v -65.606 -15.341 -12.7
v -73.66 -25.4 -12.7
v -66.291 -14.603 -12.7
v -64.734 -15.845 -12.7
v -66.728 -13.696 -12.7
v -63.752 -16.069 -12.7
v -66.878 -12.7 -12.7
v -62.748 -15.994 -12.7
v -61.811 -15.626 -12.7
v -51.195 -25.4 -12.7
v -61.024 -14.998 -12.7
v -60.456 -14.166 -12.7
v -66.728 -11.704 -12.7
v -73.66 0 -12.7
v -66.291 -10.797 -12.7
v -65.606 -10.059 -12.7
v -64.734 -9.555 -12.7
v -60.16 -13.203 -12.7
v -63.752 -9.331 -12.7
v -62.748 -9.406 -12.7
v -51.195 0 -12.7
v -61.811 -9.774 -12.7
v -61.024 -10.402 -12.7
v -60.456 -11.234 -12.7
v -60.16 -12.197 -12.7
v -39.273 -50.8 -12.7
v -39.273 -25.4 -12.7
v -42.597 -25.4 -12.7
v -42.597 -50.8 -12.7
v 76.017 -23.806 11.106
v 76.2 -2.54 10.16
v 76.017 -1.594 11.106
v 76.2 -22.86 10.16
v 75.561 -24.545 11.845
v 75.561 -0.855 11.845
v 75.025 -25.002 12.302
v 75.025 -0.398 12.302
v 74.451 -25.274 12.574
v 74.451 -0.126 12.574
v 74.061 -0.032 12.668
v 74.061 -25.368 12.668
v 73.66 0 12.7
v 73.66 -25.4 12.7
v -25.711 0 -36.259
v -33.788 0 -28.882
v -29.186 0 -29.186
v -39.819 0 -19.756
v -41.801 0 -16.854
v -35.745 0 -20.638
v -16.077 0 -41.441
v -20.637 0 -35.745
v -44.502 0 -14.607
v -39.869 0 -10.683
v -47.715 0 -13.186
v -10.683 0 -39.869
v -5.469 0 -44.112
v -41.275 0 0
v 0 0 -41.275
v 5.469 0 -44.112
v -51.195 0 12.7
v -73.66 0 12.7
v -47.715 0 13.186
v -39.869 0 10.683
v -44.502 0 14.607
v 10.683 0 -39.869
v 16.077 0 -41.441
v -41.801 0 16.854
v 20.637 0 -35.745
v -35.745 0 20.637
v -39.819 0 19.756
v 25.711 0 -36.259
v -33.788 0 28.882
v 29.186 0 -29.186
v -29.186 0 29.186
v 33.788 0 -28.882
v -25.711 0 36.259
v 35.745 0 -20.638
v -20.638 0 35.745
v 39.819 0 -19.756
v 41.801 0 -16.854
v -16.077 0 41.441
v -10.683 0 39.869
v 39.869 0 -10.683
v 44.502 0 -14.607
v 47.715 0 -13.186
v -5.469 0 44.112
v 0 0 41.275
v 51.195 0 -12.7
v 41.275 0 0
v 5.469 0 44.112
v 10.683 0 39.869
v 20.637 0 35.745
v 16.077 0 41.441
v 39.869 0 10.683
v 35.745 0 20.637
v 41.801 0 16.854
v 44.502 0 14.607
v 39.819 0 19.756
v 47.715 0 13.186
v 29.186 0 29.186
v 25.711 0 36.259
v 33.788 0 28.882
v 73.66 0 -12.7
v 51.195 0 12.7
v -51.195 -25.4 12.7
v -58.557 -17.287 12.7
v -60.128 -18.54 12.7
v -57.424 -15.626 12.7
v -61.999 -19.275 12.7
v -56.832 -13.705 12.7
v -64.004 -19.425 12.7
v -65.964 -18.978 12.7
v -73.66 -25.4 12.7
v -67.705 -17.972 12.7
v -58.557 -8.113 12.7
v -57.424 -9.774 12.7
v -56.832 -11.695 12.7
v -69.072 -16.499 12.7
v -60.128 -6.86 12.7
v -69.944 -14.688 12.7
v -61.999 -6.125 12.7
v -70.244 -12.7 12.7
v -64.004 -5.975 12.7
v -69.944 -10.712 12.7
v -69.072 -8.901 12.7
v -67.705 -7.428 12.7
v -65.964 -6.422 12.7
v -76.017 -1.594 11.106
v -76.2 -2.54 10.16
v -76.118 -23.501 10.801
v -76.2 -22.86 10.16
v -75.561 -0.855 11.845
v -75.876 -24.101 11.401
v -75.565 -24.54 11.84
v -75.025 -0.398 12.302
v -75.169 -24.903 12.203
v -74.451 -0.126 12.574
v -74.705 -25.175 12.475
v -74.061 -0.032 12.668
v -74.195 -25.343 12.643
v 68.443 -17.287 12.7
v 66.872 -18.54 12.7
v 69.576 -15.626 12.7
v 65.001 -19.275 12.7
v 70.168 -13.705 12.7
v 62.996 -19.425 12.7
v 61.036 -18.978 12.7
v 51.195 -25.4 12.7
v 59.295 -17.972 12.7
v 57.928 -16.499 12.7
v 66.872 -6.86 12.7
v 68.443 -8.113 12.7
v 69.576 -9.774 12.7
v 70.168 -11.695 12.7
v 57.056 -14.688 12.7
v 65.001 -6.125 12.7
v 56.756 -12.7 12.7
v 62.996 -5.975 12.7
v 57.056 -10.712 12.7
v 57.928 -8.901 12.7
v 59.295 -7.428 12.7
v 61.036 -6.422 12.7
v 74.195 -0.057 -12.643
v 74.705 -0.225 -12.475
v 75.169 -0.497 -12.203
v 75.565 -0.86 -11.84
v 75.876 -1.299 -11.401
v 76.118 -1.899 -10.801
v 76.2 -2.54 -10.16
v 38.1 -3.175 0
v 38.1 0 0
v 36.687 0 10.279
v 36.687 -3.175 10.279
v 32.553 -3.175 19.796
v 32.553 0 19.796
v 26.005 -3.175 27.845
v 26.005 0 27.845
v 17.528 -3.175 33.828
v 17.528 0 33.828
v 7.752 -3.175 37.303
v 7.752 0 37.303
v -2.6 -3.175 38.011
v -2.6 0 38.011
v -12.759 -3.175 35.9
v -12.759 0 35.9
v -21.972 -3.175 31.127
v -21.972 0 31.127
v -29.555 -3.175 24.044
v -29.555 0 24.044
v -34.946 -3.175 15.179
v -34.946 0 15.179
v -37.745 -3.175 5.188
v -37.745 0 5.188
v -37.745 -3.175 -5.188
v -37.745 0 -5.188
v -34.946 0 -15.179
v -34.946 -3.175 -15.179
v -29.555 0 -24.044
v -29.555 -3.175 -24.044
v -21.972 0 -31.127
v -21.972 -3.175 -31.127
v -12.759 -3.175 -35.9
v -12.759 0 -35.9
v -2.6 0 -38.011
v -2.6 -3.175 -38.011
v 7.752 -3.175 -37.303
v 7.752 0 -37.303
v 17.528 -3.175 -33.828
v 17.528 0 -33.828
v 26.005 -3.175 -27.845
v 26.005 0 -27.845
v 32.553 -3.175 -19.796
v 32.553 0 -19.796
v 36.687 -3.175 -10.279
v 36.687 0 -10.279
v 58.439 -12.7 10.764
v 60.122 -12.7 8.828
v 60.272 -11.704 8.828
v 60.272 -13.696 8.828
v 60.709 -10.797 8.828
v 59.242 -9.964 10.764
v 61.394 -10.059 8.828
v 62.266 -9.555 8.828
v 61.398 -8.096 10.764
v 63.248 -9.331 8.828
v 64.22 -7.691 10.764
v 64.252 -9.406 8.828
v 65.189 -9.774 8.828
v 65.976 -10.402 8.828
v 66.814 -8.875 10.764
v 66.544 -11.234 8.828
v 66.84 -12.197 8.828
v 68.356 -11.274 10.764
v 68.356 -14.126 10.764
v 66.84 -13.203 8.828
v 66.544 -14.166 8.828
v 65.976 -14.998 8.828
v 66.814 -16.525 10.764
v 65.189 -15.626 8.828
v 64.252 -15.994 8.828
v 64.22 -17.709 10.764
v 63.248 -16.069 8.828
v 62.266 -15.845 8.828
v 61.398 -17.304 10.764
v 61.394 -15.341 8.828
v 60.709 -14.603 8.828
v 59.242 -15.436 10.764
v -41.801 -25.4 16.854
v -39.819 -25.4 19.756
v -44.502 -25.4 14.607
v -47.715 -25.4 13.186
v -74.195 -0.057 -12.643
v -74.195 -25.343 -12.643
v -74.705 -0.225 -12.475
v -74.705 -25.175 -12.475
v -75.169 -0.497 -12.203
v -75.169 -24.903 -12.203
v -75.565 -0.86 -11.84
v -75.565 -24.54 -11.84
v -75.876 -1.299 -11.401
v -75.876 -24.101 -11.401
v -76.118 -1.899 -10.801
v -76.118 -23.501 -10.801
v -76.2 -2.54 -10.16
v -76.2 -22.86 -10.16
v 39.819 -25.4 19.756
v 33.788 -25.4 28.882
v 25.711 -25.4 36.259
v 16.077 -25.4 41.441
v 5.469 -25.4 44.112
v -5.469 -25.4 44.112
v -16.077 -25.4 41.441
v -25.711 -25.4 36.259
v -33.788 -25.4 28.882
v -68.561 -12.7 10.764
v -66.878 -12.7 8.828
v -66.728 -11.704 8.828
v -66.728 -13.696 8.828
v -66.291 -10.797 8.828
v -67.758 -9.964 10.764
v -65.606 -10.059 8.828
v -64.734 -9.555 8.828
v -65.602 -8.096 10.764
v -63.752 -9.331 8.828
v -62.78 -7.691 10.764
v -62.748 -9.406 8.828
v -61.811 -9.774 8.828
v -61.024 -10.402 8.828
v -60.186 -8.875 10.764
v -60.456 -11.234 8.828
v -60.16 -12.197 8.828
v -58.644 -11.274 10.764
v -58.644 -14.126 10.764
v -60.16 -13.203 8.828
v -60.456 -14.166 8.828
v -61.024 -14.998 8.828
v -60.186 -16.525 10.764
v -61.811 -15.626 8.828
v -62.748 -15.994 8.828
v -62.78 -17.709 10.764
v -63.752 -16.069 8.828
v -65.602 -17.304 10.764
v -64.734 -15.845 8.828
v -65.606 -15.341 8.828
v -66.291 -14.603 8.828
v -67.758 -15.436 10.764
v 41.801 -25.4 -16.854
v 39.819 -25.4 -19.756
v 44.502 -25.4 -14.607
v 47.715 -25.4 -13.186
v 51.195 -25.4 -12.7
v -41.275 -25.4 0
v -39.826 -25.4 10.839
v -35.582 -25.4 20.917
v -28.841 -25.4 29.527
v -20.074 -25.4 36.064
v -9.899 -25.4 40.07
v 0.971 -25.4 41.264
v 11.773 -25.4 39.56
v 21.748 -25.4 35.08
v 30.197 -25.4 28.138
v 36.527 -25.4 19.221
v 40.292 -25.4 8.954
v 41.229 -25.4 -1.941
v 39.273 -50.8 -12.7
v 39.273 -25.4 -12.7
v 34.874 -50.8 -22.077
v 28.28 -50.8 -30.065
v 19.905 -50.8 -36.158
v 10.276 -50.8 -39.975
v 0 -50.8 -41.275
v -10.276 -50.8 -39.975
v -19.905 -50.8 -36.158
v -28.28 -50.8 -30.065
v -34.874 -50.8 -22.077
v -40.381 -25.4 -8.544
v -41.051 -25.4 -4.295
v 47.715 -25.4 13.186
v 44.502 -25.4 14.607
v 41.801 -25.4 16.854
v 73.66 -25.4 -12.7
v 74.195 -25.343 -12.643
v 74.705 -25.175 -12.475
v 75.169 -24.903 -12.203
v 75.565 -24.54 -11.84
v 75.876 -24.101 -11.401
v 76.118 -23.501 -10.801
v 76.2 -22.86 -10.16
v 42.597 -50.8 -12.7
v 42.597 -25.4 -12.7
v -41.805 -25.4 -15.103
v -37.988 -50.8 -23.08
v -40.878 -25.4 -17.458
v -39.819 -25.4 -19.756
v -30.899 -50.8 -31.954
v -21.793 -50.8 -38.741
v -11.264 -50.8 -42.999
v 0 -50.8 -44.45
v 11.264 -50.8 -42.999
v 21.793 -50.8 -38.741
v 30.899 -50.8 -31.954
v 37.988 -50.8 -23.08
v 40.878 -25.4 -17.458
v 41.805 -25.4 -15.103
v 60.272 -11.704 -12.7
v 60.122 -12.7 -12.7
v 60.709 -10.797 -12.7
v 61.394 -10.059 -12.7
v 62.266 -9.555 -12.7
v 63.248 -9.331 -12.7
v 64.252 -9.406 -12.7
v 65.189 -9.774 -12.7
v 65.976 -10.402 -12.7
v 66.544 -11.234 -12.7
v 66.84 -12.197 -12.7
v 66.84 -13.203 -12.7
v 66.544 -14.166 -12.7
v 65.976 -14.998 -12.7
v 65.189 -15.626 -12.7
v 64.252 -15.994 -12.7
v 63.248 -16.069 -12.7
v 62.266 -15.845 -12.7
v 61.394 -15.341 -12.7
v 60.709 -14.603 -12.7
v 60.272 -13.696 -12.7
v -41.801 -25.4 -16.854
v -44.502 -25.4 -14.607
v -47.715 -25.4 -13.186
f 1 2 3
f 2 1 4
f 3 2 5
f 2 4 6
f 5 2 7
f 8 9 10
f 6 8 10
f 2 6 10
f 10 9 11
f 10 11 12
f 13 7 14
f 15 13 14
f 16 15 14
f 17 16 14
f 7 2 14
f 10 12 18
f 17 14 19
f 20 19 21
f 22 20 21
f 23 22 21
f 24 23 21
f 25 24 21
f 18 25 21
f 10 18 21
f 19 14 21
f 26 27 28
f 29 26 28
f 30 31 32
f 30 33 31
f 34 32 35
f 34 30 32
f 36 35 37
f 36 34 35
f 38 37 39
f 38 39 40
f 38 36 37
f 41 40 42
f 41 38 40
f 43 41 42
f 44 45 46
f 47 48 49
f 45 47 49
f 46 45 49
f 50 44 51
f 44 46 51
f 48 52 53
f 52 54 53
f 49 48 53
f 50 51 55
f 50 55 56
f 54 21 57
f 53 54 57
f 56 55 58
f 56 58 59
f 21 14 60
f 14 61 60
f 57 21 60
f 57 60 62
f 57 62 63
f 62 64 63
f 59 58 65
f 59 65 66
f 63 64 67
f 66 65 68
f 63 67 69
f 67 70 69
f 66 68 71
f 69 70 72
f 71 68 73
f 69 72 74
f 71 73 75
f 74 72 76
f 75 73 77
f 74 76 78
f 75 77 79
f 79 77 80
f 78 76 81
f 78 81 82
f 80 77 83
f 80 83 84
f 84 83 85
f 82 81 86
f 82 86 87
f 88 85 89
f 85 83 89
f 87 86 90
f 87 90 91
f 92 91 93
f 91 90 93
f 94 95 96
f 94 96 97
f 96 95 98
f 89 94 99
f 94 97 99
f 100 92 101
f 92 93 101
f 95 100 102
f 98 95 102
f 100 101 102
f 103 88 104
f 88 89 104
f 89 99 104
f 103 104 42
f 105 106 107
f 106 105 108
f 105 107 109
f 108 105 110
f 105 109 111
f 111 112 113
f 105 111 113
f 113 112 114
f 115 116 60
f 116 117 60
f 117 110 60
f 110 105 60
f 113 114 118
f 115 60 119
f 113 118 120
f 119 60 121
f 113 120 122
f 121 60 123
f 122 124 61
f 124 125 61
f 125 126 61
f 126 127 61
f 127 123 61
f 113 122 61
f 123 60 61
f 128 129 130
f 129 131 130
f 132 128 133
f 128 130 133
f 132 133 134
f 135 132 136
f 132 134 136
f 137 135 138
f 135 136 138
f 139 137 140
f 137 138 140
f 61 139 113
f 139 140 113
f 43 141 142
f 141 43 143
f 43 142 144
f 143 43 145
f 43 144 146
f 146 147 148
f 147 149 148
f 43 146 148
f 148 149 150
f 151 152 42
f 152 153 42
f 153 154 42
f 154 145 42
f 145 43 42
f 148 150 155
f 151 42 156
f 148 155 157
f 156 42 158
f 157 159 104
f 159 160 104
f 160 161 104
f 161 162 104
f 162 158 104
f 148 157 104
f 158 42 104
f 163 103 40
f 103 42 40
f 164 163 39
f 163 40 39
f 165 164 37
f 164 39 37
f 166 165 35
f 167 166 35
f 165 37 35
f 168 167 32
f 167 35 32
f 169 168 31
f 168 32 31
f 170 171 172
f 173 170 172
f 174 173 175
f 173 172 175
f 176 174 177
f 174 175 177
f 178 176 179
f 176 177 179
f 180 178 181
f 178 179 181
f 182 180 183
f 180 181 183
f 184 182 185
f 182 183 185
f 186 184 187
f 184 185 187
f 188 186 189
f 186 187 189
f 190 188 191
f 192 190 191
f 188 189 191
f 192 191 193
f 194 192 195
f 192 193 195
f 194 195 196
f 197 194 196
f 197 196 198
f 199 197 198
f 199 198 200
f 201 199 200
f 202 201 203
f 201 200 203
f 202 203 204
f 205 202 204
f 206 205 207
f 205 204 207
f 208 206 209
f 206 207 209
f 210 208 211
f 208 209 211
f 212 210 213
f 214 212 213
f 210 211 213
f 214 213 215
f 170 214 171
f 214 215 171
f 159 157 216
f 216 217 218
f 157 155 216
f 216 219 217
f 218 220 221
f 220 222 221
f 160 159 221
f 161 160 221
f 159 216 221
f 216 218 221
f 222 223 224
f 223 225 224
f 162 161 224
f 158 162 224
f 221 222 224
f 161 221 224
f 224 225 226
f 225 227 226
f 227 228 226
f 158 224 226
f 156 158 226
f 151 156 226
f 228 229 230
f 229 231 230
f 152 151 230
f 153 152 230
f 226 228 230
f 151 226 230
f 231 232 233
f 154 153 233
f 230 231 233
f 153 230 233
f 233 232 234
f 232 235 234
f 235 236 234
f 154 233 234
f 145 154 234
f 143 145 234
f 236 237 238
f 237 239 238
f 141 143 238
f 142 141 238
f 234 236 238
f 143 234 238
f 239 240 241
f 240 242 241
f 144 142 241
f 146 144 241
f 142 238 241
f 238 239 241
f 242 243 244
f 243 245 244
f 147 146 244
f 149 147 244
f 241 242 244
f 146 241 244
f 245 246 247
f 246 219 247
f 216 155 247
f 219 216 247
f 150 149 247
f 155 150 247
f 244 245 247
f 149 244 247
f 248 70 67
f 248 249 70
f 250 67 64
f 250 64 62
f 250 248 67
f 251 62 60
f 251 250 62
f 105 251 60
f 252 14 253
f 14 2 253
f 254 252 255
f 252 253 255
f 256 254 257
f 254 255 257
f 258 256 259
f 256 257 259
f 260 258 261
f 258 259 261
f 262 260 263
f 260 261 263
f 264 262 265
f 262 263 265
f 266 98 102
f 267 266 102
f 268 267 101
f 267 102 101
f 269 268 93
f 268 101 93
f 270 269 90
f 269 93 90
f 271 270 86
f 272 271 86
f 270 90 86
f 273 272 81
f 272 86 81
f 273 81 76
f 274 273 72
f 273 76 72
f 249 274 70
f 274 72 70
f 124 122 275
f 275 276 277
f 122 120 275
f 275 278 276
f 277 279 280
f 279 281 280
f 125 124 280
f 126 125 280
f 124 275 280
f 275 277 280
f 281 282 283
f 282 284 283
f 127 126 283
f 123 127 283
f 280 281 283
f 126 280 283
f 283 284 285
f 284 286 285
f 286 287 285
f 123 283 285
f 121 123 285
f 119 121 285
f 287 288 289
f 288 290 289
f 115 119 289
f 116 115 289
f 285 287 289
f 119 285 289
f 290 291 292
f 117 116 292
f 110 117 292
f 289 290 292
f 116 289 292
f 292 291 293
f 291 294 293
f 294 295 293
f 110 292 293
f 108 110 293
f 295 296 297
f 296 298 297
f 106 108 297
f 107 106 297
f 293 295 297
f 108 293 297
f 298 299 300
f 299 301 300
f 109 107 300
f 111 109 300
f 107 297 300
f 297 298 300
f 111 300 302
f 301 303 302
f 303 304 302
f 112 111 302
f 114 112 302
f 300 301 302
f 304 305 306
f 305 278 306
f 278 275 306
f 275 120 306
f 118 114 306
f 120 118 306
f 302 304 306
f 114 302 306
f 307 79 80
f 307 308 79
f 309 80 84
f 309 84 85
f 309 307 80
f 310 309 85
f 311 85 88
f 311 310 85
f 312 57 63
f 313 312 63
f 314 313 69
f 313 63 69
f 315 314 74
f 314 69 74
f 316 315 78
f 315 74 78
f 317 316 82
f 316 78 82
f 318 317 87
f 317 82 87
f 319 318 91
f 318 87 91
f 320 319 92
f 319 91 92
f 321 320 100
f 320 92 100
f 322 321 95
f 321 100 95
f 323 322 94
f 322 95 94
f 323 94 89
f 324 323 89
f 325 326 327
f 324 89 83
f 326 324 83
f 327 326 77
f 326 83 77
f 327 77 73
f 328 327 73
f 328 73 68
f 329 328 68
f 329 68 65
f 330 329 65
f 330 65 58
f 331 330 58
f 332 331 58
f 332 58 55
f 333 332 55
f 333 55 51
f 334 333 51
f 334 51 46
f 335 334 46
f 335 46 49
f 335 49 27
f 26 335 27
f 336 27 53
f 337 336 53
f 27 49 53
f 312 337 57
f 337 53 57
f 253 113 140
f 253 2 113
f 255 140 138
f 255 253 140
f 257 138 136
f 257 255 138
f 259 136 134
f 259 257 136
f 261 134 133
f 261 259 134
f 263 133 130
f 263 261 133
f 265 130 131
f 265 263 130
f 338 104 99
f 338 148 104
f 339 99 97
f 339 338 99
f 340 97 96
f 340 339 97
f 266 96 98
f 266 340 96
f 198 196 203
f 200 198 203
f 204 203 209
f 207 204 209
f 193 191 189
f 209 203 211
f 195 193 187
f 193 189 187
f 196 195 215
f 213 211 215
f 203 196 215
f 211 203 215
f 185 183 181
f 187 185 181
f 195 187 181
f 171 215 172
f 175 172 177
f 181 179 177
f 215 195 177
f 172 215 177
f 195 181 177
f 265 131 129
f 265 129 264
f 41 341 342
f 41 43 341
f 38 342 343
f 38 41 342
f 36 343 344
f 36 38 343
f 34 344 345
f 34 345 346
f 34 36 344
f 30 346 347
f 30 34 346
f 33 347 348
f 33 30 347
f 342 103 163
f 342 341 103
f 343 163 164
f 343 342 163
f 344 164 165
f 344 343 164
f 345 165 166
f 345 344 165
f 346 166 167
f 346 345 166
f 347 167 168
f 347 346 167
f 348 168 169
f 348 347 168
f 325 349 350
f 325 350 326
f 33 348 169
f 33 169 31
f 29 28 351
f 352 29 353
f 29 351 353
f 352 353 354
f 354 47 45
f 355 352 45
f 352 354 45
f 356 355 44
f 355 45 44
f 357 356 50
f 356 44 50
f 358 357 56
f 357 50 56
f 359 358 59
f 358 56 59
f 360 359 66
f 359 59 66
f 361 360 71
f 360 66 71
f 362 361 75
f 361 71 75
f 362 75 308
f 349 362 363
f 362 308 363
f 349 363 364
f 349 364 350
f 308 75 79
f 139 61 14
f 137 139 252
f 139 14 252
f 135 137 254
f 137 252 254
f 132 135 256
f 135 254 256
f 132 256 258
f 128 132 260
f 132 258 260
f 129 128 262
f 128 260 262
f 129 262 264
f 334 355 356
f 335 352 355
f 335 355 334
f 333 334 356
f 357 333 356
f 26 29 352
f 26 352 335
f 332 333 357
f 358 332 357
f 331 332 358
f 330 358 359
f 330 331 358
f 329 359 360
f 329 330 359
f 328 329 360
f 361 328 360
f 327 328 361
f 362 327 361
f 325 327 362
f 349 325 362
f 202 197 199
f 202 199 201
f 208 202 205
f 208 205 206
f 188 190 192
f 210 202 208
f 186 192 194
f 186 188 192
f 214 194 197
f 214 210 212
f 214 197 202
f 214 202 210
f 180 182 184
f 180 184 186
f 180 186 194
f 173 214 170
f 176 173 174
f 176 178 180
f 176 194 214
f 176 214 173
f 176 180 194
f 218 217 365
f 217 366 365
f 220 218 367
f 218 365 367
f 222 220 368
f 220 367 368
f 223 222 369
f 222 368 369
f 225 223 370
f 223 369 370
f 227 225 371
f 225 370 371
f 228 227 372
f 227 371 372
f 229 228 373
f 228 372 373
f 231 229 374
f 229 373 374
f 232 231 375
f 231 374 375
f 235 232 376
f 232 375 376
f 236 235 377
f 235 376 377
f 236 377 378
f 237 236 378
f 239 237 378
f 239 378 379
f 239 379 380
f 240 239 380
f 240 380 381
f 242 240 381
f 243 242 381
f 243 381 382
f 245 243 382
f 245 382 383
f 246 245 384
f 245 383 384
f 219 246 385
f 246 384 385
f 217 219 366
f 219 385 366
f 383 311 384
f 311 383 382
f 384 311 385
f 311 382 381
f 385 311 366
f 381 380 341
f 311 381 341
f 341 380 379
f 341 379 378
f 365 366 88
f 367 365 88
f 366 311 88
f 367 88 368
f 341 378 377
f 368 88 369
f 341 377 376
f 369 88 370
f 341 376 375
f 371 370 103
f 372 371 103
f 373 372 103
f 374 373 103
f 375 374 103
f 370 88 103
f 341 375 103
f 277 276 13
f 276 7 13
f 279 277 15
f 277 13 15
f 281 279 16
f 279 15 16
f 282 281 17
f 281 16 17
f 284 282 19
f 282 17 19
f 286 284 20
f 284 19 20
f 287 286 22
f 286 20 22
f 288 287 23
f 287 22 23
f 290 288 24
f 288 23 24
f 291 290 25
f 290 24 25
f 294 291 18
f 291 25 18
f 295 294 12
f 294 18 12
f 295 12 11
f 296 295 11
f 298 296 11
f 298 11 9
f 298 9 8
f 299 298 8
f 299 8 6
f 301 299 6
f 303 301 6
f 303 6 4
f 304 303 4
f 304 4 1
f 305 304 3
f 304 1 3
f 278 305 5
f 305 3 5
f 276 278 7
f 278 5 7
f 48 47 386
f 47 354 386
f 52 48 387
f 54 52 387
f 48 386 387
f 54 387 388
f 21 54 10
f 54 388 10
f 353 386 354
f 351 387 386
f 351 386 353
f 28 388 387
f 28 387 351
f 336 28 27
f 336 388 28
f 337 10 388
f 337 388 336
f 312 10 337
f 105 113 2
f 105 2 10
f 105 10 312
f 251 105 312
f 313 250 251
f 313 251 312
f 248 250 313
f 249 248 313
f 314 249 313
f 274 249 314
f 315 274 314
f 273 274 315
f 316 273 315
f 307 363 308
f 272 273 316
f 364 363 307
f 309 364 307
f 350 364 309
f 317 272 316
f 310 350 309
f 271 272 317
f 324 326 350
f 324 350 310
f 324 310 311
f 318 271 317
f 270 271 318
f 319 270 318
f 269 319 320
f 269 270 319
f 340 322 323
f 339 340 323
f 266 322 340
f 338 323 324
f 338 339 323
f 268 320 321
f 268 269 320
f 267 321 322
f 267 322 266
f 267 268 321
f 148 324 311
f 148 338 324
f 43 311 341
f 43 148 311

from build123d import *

# Parameters (mm, degrees)
F1_DEPTH       = 50.8
F2_DEPTH       = 25.4
F4_D           = 6.7564
F4_CSINK_D     = 13.4874
F4_CSINK_ANGLE = 82
F5_R           = 12.7
F6_R           = 2.54
F7_R           = 41.275
F8_DEPTH       = 72.39
F9_R           = 38.1
F10_DEPTH      = 3.175


with BuildPart() as f1:
    # F0 (on Front) → F1 (new body)
    with BuildSketch(Plane.XZ):
        with BuildLine():
            ThreePointArc((-42.5970949714, -12.7), (0, -44.45), (42.5970949714, -12.7))
            Line((42.5970949714, -12.7), (-42.5970949714, -12.7))
        make_face()
    extrude(amount=F1_DEPTH)

    # F0 (on Front) → F2 (join)
    with BuildSketch(Plane.XZ):
        with BuildLine():
            ThreePointArc((42.5970949714, -12.7), (43.9843345492, -6.4172279265), (44.45, 0))
            ThreePointArc((44.45, 0), (43.9843345492, 6.4172279265), (42.5970949714, 12.7))
            Line((42.5970949714, 12.7), (-42.5970949714, 12.7))
            ThreePointArc((-42.5970949714, 12.7), (-44.45, 0), (-42.5970949714, -12.7))
            Line((-42.5970949714, -12.7), (42.5970949714, -12.7))
        make_face()
        with BuildLine():
            ThreePointArc((42.5970949714, 12.7), (43.9843345492, 6.4172279265), (44.45, 0))
            ThreePointArc((44.45, 0), (43.9843345492, -6.4172279265), (42.5970949714, -12.7))
            Line((42.5970949714, -12.7), (76.2, -12.7))
            Line((76.2, -12.7), (76.2, 12.7))
            Line((76.2, 12.7), (42.5970949714, 12.7))
        make_face()
        with BuildLine():
            Line((-42.5970949714, 12.7), (42.5970949714, 12.7))
            ThreePointArc((42.5970949714, 12.7), (0, 44.45), (-42.5970949714, 12.7))
        make_face()
        with BuildLine():
            ThreePointArc((-42.5970949714, -12.7), (0, -44.45), (42.5970949714, -12.7))
            Line((42.5970949714, -12.7), (-42.5970949714, -12.7))
        make_face()
        with BuildLine():
            ThreePointArc((-42.5970949714, -12.7), (-44.45, 0), (-42.5970949714, 12.7))
            Line((-42.5970949714, 12.7), (-76.2, 12.7))
            Line((-76.2, 12.7), (-76.2, -12.7))
            Line((-76.2, -12.7), (-42.5970949714, -12.7))
        make_face()
    extrude(amount=F2_DEPTH)

    # F4 (through all)
    with Locations(Plane.XY.offset(12.7)):
        with Locations((-63.5, -12.7), (63.5, -12.7)):
            CounterSinkHole(F4_D / 2, F4_CSINK_D / 2, counter_sink_angle=F4_CSINK_ANGLE)

    # F5
    f5_edges = [f1.edges().sort_by_distance(p)[0] for p in [
        (-42.597095, -12.7, -12.7),
        (42.597095, -12.7, -12.7),
        (-42.597095, -12.7, 12.7),
        (42.597095, -12.7, 12.7),
    ]]
    fillet(f5_edges, radius=F5_R)

    # F6
    f6_edges = [f1.edges().sort_by_distance(p)[0] for p in [
        (-76.2, -25.4, 0),
        (-76.2, -12.7, 12.7),
        (-76.2, -12.7, -12.7),
        (-76.2, 0, 0),
        (76.2, -12.7, 12.7),
        (76.2, -12.7, -12.7),
        (76.2, 0, 0),
        (76.2, -25.4, 0),
    ]]
    fillet(f6_edges, radius=F6_R)

    # F7 (on face) → F8 (cut, symmetric)
    with BuildSketch(Plane(origin=(0, 0, 0), x_dir=(-1, 0, 0), z_dir=(0, 1, 0))):
        Circle(F7_R)
    extrude(amount=F8_DEPTH, both=True, mode=Mode.SUBTRACT)


with BuildPart() as f10:
    # F9 (on Front) → F10 (new body)
    with BuildSketch(Plane.XZ):
        Circle(F9_R)
    extrude(amount=F10_DEPTH)


solid = Compound([f1.part, f10.part])
